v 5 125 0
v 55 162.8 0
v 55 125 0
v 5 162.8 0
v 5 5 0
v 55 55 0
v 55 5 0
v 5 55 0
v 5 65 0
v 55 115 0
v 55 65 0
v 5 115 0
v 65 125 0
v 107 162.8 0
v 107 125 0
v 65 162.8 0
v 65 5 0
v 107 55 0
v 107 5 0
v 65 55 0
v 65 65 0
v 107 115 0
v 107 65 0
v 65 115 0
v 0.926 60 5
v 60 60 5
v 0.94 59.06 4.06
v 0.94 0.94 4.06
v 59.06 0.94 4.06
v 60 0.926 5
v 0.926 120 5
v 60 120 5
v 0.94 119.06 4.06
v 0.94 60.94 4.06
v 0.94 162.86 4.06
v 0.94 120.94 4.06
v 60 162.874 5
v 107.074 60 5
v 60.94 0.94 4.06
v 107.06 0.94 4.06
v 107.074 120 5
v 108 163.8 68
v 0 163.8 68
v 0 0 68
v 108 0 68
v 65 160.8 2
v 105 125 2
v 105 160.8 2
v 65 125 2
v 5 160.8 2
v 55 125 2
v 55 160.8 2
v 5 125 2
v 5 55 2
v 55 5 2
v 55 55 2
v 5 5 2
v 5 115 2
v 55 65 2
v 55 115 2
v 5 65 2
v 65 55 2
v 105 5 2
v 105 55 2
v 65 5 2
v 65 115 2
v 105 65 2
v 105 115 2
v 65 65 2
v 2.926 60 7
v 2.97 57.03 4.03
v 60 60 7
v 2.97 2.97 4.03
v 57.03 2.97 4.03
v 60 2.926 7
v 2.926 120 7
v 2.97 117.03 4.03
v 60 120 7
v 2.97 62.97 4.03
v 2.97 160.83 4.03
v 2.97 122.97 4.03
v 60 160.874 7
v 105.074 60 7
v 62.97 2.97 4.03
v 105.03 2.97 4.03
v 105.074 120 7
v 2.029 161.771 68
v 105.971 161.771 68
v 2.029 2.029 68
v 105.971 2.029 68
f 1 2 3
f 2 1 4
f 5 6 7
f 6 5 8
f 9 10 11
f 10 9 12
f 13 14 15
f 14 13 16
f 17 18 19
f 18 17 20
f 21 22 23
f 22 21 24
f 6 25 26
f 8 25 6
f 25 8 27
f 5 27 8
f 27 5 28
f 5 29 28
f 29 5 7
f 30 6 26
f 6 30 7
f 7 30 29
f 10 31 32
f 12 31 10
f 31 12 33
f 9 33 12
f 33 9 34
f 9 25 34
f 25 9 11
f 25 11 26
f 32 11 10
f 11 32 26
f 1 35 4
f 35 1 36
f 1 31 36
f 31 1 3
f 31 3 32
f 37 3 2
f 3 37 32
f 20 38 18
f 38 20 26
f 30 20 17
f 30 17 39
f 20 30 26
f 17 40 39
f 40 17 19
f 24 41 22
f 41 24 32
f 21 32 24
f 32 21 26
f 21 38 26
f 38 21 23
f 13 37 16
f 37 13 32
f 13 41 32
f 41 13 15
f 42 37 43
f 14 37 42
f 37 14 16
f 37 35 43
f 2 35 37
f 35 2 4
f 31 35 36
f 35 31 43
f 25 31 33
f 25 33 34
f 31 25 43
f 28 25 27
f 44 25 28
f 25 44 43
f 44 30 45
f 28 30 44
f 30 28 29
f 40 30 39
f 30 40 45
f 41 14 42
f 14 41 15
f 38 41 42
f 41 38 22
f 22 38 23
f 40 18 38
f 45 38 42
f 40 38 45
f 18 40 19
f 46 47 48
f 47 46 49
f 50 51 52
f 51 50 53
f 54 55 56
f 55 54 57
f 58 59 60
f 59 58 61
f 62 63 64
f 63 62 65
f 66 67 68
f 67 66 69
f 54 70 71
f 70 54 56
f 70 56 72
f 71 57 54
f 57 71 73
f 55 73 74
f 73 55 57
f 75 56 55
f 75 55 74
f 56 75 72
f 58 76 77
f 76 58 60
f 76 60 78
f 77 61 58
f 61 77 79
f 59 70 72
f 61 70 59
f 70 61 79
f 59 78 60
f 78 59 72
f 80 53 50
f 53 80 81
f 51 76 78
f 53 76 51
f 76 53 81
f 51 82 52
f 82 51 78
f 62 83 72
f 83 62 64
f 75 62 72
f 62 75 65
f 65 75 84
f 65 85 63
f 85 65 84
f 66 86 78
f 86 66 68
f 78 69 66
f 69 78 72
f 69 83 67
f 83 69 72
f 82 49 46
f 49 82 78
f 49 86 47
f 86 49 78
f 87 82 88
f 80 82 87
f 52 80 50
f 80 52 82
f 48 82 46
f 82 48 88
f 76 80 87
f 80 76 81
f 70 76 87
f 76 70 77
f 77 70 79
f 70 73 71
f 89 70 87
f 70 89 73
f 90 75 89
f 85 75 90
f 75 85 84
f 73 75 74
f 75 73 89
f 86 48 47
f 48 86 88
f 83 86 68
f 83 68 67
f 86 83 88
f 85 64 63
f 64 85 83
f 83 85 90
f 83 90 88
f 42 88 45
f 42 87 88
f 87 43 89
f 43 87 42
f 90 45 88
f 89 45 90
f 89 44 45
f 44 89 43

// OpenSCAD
// file: grid.scad
include <config.scad>
use <../wiki-yoinks/prism.scad>

module GridSquare(grid_size, grid_height) {
    color([ 99 / 255, 30 / 255, 30 / 255 ]) {
        translate([ 0, grid_size - grid_height, 0 ]) {
            prism(grid_size, grid_height, grid_height);
        }
        translate([ grid_height, 0, 0 ]) {
            rotate([ 0, 0, 90 ]) { prism(grid_size, grid_height, grid_height); }
        }
        translate([ grid_size, grid_height, 0 ]) {
            rotate([ 0, 0, 180 ]) { prism(grid_size, grid_height, grid_height); }
        }
        translate([
            grid_size - grid_height,
            grid_size,
            0
        ]) {
            rotate([ 0, 0, 270 ]) { prism(grid_size, grid_height, grid_height); }
        }
    }
}

module MultiGrid(grid_size, grid_height, grid_x, grid_y){
    for (i = [0:grid_x-1]) {
        for (j = [0:grid_y-1]) {
            translate([i*grid_size,j*grid_size,0]){
                GridSquare(grid_size, grid_height);
            }
        }
    }
}

if (is_single_unit) {
    MultiGrid(grid_size, grid_height, 1, 1);
}
// file: config.scad
$fn = 60;

grid_size = 60;
grid_height = 5;

// Box height in mm, recommended to be slightly smaller than
box_height = 68;
// pitch of the slope in mm
slope_pitch = 1; 
// wall thickness in mm
wall_size = 2;



///////////// Overridden by the generator. Only change if you are generating one offs /////////////
// They are the ratios based on the grid_size, so a ratio of 2 will give you 2*60=120mm if grid_size=60
grid_x = 2;
grid_y = 2;
// Supports partial sizes if you want a 1.8 * 2.73 box, for example
// Goin
box_x = 1.8;
box_y = 2.73;


is_single_unit = true;
// file: ../wiki-yoinks/prism.scad
module prism(l, w, h) {
    // from wiki
    // https://en.wikibooks.org/wiki/OpenSCAD_User_Manual/Primitive_Solids#polyhedron
    polyhedron(points =
                   [
                       [ 0, 0, 0 ], [ l, 0, 0 ], [ l, w, 0 ], [ 0, w, 0 ],
                       [ 0, w, h ], [ l, w, h ]
                   ],
               faces = [
                   [ 0, 1, 2, 3 ], [ 5, 4, 3, 2 ], [ 0, 4, 5, 1 ], [ 0, 3, 4 ],
                   [ 5, 2, 1 ]
               ]);
}
// main file
use <../wiki-yoinks/prism.scad>
include <config.scad>
use <grid.scad>

module Slope(slope_x, slope_y, slope_pitch) {
    translate([ 0, slope_y - slope_pitch, 0 ]) {
        prism(slope_x, slope_pitch, box_height);
    }
    translate([ slope_pitch, 0, 0 ]) {
        rotate([ 0, 0, 90 ]) { prism(slope_y, slope_pitch, box_height); }
    }
    translate([ slope_x, slope_pitch, 0 ]) {
        rotate([ 0, 0, 180 ]) { prism(slope_x, slope_pitch, box_height); }
    }
    translate([ slope_x - slope_pitch, slope_y, 0 ]) {
        rotate([ 0, 0, 270 ]) { prism(slope_y, slope_pitch, box_height); }
    }
}

module InnerBox(box_size_x, box_size_y, wall_size) {
    wall_offset = (wall_size + slope_pitch * 2);
    inner_x = box_size_x - wall_offset;
    inner_y = box_size_y - wall_offset;
    translate([ 0, 0, wall_offset/2 ]) {
        difference() {
            translate([ wall_offset / 2, wall_offset / 2, 0 ]) {
                cube([ inner_x, inner_y, box_height ]);
            }
            translate([ wall_offset / 2, wall_offset / 2, 0 ]) {
                Slope(inner_x, inner_y, slope_pitch);
            }
            MultiGrid(grid_size, grid_height, ceil(box_x), ceil(box_y));
        }
    }
}

module Container(box_height, grid_size, grid_height, slope_pitch, wall_size,
                 box_x, box_y) {

    box_size_x = grid_size * box_x;
    box_size_y = grid_size * box_y;

    difference() {
        cube(size = [ grid_size * box_x, grid_size * box_y, box_height ]);
        MultiGrid(grid_size, grid_height, ceil(box_x), ceil(box_y));
        Slope(box_size_x, box_size_y, slope_pitch);
        InnerBox(box_size_x, box_size_y, wall_size);
    }
}

if (is_single_unit) {
    Container(box_height, grid_size, grid_height, slope_pitch, wall_size, box_x,
          box_y);
}
